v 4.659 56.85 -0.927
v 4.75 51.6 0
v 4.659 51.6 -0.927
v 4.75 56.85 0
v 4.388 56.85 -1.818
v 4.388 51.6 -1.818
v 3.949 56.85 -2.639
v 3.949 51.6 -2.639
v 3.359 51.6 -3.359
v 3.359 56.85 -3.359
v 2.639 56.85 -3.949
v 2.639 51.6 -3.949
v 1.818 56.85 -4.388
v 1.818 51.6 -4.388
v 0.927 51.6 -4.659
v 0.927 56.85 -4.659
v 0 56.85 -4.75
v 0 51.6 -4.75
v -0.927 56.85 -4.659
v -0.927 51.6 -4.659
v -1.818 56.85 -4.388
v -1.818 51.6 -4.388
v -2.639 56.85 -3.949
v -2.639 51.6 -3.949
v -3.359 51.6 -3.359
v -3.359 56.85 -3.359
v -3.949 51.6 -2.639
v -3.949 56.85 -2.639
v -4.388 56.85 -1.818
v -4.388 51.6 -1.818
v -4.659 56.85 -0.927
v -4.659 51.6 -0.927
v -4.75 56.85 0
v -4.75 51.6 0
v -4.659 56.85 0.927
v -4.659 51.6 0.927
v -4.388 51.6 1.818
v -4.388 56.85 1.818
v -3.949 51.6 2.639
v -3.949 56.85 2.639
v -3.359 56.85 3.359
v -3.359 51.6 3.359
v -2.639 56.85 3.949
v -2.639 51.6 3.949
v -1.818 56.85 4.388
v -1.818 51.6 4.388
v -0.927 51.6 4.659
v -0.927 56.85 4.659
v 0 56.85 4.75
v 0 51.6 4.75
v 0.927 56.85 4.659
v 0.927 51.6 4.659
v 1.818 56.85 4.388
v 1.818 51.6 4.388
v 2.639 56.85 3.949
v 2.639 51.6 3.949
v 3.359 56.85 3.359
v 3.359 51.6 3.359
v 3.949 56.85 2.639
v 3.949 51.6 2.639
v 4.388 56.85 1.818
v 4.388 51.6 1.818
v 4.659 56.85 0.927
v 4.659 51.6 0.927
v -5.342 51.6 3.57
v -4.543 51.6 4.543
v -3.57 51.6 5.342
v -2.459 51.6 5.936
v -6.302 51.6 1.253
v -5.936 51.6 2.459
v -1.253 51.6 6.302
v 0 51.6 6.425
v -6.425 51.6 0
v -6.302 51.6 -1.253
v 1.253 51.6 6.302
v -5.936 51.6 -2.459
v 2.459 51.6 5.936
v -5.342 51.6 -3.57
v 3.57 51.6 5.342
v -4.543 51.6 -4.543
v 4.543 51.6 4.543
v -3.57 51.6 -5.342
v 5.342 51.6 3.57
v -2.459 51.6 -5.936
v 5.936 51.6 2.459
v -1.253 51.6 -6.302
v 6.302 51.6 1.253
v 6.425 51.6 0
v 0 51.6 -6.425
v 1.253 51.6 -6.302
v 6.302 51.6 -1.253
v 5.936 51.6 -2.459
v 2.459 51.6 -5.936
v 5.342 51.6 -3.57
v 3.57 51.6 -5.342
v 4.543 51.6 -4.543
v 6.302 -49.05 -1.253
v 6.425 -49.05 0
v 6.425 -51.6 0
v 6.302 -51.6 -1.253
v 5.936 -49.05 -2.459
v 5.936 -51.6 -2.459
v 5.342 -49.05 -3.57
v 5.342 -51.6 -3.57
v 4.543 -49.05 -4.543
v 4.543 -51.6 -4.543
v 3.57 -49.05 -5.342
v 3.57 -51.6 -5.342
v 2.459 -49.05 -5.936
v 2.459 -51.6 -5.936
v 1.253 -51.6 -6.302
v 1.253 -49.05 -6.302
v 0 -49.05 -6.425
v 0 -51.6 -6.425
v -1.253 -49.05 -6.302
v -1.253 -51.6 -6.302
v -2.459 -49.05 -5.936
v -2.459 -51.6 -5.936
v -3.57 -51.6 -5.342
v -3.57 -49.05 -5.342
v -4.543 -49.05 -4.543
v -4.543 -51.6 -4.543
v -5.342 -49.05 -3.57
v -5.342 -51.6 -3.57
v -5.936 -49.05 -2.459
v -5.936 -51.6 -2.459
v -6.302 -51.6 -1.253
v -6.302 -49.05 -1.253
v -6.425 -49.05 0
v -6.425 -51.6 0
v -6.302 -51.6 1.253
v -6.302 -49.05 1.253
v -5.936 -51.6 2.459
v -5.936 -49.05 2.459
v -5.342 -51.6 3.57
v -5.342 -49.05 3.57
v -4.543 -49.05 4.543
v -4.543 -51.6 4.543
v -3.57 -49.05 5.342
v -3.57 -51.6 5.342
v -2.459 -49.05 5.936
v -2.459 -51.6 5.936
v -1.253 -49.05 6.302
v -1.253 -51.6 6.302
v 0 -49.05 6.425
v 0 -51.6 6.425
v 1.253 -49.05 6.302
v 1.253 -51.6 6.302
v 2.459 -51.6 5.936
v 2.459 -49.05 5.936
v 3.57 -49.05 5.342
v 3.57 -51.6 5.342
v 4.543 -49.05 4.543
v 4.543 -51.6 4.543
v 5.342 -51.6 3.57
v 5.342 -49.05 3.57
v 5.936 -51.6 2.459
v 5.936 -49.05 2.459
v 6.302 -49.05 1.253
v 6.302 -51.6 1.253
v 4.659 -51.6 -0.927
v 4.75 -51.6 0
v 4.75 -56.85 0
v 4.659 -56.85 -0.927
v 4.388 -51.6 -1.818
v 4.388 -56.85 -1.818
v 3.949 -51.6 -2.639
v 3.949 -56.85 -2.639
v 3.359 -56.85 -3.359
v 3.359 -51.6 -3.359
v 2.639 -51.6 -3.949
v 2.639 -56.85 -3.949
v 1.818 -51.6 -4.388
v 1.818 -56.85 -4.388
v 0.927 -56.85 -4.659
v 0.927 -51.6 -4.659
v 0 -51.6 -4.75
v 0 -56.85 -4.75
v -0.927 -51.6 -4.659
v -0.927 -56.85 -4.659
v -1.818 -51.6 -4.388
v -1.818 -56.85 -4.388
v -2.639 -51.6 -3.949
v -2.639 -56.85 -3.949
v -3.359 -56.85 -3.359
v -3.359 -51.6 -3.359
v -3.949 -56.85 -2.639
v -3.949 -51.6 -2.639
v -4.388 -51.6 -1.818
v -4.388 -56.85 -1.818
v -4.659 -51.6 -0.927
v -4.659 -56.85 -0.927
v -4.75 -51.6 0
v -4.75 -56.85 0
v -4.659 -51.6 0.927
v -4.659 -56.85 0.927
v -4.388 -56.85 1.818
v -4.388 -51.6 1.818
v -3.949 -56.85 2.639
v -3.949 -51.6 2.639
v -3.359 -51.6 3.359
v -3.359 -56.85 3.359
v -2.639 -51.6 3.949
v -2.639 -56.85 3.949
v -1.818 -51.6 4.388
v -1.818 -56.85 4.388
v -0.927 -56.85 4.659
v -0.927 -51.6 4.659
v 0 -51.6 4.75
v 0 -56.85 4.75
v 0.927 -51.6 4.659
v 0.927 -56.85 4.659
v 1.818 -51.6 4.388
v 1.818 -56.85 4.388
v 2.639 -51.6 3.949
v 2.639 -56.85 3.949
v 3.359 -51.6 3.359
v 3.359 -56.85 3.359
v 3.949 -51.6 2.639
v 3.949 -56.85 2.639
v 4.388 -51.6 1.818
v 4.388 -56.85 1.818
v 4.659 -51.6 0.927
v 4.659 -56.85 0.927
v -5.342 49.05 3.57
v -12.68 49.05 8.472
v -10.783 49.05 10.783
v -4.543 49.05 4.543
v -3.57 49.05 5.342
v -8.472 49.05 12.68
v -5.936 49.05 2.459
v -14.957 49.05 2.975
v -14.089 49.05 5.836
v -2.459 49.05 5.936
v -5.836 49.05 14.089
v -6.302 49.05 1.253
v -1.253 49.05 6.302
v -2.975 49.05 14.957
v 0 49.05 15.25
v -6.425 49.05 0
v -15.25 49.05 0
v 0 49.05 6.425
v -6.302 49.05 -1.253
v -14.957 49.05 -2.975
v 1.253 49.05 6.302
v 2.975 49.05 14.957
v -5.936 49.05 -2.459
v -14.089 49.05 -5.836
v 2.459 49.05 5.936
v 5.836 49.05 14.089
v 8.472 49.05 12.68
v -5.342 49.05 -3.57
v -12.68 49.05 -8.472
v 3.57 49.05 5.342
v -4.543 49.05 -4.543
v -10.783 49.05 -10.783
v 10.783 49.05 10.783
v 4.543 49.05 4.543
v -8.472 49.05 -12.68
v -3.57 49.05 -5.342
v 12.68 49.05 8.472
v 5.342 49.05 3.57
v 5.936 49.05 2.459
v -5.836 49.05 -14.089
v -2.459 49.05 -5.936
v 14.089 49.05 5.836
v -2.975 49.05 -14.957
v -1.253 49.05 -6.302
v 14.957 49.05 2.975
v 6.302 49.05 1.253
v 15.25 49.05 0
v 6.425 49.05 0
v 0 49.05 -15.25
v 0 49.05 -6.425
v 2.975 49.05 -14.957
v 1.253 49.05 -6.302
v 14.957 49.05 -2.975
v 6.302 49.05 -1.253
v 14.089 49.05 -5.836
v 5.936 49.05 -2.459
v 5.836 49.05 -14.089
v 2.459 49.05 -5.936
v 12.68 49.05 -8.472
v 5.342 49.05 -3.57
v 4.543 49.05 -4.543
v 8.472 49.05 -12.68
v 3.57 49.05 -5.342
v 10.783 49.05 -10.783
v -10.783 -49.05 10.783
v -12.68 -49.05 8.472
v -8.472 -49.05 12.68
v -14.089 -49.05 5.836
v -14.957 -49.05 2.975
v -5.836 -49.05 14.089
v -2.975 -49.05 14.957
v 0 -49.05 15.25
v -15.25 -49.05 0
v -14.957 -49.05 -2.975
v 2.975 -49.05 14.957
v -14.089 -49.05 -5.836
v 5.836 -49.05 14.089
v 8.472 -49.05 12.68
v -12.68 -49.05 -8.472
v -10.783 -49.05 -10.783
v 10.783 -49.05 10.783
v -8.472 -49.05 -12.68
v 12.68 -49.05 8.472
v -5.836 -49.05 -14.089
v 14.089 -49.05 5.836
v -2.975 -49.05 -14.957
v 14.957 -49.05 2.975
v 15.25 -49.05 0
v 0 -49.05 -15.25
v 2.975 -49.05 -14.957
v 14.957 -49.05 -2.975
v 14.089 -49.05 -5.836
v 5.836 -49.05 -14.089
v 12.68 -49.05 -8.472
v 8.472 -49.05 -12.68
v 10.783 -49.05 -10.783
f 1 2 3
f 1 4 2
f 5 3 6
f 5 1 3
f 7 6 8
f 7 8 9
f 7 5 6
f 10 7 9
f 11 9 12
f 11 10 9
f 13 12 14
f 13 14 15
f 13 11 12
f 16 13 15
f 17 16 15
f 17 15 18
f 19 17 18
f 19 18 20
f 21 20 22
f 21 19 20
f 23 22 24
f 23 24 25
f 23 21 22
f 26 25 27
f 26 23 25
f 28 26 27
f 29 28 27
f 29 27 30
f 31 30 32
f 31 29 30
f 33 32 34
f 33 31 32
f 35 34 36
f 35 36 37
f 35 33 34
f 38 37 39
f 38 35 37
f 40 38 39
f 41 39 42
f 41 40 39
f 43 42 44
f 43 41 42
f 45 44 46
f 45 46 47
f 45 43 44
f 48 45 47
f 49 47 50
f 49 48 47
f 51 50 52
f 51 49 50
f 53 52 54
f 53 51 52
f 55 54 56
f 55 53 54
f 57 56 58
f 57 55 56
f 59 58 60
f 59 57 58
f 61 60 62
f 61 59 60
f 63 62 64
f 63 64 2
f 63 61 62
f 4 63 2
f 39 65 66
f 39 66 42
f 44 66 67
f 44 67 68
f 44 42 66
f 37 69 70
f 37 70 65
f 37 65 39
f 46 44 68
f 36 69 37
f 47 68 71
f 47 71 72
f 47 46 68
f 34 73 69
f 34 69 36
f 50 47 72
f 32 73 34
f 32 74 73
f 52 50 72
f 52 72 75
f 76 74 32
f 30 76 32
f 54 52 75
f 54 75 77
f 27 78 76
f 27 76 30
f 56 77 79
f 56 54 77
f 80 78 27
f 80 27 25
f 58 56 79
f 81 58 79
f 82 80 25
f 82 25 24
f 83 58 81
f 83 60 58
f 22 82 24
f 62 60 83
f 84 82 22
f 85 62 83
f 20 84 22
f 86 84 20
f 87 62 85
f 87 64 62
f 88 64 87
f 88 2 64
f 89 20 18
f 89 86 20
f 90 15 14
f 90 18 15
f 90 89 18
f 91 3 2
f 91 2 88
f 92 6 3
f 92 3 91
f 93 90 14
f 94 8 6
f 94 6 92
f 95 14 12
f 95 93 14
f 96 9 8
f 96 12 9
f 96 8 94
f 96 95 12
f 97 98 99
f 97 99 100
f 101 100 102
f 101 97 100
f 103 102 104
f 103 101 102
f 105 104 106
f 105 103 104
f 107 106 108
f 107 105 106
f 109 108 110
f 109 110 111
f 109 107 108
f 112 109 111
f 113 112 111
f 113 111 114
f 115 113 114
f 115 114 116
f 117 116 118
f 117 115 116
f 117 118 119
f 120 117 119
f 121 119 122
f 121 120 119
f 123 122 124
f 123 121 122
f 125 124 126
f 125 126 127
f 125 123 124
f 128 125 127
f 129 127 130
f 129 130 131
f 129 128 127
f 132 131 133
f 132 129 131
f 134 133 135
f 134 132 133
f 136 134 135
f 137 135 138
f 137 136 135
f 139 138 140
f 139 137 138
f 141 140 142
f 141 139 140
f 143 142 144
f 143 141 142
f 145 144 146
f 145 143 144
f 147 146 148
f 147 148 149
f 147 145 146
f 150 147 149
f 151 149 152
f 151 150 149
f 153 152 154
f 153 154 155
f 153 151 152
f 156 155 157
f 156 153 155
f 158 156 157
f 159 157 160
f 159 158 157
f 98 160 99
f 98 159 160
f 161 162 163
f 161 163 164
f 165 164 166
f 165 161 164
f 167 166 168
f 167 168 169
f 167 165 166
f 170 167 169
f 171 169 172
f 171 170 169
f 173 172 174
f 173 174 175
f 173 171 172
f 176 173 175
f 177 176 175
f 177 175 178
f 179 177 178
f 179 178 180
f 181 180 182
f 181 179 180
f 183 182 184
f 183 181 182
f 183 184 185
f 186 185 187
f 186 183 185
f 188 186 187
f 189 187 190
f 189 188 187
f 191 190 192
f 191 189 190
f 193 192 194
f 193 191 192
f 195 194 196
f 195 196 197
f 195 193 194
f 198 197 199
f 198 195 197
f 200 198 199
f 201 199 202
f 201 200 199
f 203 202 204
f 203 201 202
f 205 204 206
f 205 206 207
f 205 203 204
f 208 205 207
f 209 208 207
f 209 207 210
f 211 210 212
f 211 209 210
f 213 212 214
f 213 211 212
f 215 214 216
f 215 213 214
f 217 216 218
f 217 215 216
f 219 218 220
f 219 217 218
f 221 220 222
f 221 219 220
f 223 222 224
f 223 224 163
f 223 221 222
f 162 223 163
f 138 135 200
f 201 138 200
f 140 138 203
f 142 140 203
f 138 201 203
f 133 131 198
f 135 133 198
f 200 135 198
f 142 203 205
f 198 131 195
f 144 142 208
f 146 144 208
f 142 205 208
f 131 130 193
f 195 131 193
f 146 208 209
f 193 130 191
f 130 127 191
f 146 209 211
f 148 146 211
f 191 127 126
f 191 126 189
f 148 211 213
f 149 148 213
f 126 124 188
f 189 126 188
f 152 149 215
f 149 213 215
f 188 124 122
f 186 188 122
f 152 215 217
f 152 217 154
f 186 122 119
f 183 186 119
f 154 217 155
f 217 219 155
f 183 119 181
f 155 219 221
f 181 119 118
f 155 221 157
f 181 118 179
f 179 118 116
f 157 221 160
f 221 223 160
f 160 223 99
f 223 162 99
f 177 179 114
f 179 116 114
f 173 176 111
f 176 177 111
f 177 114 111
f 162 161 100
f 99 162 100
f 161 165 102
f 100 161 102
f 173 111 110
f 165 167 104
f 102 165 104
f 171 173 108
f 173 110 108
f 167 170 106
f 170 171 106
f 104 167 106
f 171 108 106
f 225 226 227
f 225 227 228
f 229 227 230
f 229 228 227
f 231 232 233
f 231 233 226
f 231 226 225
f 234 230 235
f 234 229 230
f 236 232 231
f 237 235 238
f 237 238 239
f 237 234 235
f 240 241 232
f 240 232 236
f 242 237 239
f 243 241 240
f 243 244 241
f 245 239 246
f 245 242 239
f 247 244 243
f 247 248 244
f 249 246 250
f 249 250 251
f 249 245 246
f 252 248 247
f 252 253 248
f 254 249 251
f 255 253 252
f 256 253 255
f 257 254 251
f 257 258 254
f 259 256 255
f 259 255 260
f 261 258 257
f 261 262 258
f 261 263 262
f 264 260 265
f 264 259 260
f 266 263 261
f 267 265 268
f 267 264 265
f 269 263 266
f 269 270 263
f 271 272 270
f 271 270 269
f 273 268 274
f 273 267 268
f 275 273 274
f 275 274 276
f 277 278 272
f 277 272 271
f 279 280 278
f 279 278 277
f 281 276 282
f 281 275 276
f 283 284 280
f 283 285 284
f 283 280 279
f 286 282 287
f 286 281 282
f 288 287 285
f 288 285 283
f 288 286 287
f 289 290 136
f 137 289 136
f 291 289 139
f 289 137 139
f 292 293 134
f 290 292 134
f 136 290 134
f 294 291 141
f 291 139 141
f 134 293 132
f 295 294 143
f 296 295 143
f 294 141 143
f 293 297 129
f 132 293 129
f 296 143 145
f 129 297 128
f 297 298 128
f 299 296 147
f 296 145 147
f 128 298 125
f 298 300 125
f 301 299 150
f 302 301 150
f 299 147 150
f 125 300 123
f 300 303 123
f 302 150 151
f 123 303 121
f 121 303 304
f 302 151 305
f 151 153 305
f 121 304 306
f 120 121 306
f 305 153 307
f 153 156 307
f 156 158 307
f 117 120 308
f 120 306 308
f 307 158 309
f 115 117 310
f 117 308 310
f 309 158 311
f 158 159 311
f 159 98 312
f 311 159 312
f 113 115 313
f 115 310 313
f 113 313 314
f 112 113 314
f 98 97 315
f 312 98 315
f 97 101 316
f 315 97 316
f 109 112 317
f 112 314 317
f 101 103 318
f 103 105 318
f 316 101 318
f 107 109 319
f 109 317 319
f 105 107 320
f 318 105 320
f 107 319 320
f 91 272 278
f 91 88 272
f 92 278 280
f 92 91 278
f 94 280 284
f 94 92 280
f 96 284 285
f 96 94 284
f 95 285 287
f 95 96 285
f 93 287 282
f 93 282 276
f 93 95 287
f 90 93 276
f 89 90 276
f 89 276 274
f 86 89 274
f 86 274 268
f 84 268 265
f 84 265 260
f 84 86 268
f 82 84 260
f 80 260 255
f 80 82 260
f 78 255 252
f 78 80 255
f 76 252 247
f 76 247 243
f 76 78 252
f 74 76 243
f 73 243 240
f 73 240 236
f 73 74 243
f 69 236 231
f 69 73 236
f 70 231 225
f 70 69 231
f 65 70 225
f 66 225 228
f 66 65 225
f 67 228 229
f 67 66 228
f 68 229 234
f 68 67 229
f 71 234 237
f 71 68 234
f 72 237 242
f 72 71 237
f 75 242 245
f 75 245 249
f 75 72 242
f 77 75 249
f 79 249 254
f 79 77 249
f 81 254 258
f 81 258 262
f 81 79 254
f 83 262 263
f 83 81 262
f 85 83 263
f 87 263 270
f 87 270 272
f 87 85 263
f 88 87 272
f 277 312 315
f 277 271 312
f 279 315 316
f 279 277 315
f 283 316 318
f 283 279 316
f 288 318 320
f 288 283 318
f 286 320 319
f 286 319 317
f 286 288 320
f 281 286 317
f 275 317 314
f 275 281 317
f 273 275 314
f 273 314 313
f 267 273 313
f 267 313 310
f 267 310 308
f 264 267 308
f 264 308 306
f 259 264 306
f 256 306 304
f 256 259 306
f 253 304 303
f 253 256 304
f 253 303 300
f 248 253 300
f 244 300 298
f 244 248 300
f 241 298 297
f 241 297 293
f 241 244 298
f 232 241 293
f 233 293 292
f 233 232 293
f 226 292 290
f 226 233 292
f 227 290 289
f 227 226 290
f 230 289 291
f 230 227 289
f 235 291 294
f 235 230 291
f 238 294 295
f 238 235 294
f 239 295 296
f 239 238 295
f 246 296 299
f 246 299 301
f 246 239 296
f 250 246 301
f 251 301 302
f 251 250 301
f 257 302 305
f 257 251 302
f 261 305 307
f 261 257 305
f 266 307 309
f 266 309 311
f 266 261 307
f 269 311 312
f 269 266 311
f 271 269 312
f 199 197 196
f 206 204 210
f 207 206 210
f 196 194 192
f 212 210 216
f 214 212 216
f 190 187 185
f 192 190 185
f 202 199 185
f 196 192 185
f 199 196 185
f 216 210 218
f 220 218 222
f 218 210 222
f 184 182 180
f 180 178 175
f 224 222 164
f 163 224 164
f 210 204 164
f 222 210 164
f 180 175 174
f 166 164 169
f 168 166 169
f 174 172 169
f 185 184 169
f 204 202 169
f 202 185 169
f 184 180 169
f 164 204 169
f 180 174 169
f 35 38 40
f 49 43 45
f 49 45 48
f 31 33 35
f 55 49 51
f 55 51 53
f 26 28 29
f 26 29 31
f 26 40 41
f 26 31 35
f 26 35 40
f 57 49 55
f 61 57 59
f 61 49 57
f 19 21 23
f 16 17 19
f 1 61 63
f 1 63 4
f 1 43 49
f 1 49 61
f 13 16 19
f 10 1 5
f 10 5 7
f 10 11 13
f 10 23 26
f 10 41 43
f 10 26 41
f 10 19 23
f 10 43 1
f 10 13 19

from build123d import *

# Parameters (mm, degrees)
SKETCH1_R           = 6.425
BOSS_EXTRUDE1_DEPTH = 51.6
SKETCH1_3_R         = 4.75
BOSS_EXTRUDE2_DEPTH = 56.85
SKETCH1_5_R         = 15.25
SKETCH1_5_R_2       = 6.425
BOSS_EXTRUDE4_DEPTH = 49.05


with BuildPart() as part:
    # Sketch1 → Boss-Extrude1 (new, symmetric)
    with BuildSketch(Plane(origin=(0, 0, 0), x_dir=(1, 0, 0), z_dir=(0, 1, 0))):
        Circle(SKETCH1_R)
    extrude(amount=BOSS_EXTRUDE1_DEPTH, both=True)

    # Sketch1<3> → Boss-Extrude2 (add, symmetric)
    with BuildSketch(Plane(origin=(0, 0, 0), x_dir=(1, 0, 0), z_dir=(0, 1, 0))):
        Circle(SKETCH1_3_R)
    extrude(amount=BOSS_EXTRUDE2_DEPTH, both=True)

    # Sketch1<5> → Boss-Extrude4 (add, symmetric)
    with BuildSketch(Plane(origin=(0, 0, 0), x_dir=(1, 0, 0), z_dir=(0, 1, 0))):
        Circle(SKETCH1_5_R)
        Circle(SKETCH1_5_R_2, mode=Mode.SUBTRACT)
    extrude(amount=BOSS_EXTRUDE4_DEPTH, both=True)


solid = part.part
